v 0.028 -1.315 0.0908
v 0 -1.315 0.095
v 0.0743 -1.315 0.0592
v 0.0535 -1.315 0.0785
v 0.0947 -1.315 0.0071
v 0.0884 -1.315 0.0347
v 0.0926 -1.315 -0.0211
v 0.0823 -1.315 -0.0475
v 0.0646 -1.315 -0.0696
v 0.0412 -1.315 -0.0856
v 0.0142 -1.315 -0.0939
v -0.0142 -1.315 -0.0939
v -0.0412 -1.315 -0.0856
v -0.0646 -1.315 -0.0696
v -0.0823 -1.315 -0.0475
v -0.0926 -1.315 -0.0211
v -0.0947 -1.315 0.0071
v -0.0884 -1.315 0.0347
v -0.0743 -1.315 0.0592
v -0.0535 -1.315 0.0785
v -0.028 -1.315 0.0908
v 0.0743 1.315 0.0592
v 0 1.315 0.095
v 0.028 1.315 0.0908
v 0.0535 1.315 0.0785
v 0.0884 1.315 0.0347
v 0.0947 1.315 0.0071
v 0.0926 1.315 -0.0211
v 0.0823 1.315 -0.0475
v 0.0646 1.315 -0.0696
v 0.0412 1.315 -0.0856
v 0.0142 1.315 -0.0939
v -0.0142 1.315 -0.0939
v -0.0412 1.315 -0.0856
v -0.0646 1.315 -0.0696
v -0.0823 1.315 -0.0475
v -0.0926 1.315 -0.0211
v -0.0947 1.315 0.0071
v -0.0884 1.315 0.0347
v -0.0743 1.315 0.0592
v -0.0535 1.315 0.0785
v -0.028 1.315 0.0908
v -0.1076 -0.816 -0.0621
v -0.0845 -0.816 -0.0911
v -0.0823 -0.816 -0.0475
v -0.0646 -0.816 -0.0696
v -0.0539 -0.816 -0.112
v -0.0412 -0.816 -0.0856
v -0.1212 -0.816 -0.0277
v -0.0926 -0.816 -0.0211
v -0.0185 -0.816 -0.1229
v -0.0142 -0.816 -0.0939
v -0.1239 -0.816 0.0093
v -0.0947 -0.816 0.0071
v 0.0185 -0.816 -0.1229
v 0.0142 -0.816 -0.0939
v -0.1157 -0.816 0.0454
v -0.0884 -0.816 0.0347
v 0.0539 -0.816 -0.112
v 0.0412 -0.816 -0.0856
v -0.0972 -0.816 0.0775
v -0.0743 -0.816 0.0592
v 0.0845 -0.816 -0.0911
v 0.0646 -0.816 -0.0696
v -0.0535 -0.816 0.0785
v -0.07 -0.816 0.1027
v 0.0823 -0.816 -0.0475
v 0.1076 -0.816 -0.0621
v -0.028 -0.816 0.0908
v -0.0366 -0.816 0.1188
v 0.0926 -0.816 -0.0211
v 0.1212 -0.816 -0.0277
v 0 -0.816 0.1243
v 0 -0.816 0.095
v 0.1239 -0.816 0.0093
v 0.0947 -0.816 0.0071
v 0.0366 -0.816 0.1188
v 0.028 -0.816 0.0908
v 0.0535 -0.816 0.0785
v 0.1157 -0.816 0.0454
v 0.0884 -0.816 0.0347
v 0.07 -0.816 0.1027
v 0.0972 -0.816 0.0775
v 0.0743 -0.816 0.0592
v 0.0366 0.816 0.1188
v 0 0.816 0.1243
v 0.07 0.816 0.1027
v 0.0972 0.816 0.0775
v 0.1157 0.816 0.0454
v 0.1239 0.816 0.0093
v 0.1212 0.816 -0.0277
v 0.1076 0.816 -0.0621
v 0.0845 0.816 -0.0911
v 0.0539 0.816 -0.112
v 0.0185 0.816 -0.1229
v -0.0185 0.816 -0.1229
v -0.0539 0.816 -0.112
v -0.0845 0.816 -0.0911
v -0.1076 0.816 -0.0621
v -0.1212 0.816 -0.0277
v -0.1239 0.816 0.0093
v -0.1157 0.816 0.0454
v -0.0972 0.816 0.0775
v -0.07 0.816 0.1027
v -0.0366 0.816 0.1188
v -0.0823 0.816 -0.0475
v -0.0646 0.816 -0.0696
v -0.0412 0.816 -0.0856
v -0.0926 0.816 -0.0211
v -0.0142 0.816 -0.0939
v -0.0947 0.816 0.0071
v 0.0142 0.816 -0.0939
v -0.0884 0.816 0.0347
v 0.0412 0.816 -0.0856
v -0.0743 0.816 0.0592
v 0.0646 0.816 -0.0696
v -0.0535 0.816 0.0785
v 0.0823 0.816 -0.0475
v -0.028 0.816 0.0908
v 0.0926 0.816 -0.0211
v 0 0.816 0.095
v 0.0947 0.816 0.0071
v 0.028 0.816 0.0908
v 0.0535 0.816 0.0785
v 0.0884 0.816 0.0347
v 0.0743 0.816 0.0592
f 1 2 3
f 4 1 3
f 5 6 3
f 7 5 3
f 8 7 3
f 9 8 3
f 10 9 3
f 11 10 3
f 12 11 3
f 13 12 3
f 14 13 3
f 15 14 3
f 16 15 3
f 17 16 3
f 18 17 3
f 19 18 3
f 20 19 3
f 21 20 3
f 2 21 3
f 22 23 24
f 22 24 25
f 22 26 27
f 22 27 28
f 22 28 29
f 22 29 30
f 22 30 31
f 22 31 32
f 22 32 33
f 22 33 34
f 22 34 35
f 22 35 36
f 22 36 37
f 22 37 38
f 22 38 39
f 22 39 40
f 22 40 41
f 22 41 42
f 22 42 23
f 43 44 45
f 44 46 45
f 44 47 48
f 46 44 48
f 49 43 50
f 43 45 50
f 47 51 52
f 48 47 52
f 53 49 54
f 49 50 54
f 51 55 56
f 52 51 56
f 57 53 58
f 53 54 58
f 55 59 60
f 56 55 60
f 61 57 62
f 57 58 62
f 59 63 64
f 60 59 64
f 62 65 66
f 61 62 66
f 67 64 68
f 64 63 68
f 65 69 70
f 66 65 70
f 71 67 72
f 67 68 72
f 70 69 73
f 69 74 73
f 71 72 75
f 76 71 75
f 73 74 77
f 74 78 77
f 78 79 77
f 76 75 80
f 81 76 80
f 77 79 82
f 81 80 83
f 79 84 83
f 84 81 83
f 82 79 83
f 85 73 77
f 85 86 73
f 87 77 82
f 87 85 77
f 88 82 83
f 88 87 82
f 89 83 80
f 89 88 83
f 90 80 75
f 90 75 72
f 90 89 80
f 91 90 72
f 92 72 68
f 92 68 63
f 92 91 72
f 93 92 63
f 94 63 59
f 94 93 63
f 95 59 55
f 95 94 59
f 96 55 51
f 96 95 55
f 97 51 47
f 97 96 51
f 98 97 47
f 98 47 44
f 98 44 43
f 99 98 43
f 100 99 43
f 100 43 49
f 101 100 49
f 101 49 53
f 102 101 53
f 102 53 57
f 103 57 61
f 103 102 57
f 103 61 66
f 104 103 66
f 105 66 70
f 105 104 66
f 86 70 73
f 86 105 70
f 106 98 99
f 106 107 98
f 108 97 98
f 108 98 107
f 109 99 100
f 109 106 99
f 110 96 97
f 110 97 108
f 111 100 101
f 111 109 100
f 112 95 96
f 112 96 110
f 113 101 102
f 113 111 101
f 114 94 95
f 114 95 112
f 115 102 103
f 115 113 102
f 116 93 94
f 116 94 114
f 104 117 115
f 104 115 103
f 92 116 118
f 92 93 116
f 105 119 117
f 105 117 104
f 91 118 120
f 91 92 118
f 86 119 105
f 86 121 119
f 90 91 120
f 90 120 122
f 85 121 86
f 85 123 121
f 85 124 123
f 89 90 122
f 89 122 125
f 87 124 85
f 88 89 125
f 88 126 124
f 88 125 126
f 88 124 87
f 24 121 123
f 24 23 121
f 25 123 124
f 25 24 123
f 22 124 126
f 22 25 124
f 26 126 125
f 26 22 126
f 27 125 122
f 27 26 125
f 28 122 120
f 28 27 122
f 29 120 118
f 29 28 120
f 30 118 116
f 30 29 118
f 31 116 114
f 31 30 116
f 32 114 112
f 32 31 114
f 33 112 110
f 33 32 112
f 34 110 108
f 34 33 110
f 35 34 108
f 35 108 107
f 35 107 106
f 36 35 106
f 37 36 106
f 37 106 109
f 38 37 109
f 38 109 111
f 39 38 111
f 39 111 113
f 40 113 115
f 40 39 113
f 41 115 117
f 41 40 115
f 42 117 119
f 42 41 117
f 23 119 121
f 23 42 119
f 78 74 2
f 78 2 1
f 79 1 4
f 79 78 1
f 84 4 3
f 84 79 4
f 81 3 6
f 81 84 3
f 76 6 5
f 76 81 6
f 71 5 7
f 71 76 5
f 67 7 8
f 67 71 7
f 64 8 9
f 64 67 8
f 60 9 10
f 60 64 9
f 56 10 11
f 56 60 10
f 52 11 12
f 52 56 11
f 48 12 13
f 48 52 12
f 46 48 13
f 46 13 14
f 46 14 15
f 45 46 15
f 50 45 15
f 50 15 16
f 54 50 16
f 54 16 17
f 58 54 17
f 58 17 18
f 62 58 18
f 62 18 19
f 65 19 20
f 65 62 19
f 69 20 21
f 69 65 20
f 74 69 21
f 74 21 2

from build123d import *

# Parameters (mm, degrees)
SKETCH1_R           = 0.095
BOSS_EXTRUDE1_DEPTH = 1.315
SKETCH2_R           = 0.124286751
SKETCH2_R_2         = 0.095
BOSS_EXTRUDE2_DEPTH = 0.816


with BuildPart() as part:
    # Sketch1 → Boss-Extrude1 (new, symmetric)
    with BuildSketch(Plane(origin=(0, 0, 0), x_dir=(1, 0, 0), z_dir=(0, 1, 0))):
        with Locations(Location((0, 0, 0), (0, 0, 270))):
            Circle(SKETCH1_R)
    extrude(amount=BOSS_EXTRUDE1_DEPTH, both=True)

    # Sketch2 → Boss-Extrude2 (add, symmetric)
    with BuildSketch(Plane(origin=(0, 0, 0), x_dir=(1, 0, 0), z_dir=(0, 1, 0))):
        with Locations(Location((0, 0, 0), (0, 0, 270))):
            Circle(SKETCH2_R)
        with Locations(Location((0, 0, 0), (0, 0, 270))):
            Circle(SKETCH2_R_2, mode=Mode.SUBTRACT)
    extrude(amount=BOSS_EXTRUDE2_DEPTH, both=True)


solid = part.part
